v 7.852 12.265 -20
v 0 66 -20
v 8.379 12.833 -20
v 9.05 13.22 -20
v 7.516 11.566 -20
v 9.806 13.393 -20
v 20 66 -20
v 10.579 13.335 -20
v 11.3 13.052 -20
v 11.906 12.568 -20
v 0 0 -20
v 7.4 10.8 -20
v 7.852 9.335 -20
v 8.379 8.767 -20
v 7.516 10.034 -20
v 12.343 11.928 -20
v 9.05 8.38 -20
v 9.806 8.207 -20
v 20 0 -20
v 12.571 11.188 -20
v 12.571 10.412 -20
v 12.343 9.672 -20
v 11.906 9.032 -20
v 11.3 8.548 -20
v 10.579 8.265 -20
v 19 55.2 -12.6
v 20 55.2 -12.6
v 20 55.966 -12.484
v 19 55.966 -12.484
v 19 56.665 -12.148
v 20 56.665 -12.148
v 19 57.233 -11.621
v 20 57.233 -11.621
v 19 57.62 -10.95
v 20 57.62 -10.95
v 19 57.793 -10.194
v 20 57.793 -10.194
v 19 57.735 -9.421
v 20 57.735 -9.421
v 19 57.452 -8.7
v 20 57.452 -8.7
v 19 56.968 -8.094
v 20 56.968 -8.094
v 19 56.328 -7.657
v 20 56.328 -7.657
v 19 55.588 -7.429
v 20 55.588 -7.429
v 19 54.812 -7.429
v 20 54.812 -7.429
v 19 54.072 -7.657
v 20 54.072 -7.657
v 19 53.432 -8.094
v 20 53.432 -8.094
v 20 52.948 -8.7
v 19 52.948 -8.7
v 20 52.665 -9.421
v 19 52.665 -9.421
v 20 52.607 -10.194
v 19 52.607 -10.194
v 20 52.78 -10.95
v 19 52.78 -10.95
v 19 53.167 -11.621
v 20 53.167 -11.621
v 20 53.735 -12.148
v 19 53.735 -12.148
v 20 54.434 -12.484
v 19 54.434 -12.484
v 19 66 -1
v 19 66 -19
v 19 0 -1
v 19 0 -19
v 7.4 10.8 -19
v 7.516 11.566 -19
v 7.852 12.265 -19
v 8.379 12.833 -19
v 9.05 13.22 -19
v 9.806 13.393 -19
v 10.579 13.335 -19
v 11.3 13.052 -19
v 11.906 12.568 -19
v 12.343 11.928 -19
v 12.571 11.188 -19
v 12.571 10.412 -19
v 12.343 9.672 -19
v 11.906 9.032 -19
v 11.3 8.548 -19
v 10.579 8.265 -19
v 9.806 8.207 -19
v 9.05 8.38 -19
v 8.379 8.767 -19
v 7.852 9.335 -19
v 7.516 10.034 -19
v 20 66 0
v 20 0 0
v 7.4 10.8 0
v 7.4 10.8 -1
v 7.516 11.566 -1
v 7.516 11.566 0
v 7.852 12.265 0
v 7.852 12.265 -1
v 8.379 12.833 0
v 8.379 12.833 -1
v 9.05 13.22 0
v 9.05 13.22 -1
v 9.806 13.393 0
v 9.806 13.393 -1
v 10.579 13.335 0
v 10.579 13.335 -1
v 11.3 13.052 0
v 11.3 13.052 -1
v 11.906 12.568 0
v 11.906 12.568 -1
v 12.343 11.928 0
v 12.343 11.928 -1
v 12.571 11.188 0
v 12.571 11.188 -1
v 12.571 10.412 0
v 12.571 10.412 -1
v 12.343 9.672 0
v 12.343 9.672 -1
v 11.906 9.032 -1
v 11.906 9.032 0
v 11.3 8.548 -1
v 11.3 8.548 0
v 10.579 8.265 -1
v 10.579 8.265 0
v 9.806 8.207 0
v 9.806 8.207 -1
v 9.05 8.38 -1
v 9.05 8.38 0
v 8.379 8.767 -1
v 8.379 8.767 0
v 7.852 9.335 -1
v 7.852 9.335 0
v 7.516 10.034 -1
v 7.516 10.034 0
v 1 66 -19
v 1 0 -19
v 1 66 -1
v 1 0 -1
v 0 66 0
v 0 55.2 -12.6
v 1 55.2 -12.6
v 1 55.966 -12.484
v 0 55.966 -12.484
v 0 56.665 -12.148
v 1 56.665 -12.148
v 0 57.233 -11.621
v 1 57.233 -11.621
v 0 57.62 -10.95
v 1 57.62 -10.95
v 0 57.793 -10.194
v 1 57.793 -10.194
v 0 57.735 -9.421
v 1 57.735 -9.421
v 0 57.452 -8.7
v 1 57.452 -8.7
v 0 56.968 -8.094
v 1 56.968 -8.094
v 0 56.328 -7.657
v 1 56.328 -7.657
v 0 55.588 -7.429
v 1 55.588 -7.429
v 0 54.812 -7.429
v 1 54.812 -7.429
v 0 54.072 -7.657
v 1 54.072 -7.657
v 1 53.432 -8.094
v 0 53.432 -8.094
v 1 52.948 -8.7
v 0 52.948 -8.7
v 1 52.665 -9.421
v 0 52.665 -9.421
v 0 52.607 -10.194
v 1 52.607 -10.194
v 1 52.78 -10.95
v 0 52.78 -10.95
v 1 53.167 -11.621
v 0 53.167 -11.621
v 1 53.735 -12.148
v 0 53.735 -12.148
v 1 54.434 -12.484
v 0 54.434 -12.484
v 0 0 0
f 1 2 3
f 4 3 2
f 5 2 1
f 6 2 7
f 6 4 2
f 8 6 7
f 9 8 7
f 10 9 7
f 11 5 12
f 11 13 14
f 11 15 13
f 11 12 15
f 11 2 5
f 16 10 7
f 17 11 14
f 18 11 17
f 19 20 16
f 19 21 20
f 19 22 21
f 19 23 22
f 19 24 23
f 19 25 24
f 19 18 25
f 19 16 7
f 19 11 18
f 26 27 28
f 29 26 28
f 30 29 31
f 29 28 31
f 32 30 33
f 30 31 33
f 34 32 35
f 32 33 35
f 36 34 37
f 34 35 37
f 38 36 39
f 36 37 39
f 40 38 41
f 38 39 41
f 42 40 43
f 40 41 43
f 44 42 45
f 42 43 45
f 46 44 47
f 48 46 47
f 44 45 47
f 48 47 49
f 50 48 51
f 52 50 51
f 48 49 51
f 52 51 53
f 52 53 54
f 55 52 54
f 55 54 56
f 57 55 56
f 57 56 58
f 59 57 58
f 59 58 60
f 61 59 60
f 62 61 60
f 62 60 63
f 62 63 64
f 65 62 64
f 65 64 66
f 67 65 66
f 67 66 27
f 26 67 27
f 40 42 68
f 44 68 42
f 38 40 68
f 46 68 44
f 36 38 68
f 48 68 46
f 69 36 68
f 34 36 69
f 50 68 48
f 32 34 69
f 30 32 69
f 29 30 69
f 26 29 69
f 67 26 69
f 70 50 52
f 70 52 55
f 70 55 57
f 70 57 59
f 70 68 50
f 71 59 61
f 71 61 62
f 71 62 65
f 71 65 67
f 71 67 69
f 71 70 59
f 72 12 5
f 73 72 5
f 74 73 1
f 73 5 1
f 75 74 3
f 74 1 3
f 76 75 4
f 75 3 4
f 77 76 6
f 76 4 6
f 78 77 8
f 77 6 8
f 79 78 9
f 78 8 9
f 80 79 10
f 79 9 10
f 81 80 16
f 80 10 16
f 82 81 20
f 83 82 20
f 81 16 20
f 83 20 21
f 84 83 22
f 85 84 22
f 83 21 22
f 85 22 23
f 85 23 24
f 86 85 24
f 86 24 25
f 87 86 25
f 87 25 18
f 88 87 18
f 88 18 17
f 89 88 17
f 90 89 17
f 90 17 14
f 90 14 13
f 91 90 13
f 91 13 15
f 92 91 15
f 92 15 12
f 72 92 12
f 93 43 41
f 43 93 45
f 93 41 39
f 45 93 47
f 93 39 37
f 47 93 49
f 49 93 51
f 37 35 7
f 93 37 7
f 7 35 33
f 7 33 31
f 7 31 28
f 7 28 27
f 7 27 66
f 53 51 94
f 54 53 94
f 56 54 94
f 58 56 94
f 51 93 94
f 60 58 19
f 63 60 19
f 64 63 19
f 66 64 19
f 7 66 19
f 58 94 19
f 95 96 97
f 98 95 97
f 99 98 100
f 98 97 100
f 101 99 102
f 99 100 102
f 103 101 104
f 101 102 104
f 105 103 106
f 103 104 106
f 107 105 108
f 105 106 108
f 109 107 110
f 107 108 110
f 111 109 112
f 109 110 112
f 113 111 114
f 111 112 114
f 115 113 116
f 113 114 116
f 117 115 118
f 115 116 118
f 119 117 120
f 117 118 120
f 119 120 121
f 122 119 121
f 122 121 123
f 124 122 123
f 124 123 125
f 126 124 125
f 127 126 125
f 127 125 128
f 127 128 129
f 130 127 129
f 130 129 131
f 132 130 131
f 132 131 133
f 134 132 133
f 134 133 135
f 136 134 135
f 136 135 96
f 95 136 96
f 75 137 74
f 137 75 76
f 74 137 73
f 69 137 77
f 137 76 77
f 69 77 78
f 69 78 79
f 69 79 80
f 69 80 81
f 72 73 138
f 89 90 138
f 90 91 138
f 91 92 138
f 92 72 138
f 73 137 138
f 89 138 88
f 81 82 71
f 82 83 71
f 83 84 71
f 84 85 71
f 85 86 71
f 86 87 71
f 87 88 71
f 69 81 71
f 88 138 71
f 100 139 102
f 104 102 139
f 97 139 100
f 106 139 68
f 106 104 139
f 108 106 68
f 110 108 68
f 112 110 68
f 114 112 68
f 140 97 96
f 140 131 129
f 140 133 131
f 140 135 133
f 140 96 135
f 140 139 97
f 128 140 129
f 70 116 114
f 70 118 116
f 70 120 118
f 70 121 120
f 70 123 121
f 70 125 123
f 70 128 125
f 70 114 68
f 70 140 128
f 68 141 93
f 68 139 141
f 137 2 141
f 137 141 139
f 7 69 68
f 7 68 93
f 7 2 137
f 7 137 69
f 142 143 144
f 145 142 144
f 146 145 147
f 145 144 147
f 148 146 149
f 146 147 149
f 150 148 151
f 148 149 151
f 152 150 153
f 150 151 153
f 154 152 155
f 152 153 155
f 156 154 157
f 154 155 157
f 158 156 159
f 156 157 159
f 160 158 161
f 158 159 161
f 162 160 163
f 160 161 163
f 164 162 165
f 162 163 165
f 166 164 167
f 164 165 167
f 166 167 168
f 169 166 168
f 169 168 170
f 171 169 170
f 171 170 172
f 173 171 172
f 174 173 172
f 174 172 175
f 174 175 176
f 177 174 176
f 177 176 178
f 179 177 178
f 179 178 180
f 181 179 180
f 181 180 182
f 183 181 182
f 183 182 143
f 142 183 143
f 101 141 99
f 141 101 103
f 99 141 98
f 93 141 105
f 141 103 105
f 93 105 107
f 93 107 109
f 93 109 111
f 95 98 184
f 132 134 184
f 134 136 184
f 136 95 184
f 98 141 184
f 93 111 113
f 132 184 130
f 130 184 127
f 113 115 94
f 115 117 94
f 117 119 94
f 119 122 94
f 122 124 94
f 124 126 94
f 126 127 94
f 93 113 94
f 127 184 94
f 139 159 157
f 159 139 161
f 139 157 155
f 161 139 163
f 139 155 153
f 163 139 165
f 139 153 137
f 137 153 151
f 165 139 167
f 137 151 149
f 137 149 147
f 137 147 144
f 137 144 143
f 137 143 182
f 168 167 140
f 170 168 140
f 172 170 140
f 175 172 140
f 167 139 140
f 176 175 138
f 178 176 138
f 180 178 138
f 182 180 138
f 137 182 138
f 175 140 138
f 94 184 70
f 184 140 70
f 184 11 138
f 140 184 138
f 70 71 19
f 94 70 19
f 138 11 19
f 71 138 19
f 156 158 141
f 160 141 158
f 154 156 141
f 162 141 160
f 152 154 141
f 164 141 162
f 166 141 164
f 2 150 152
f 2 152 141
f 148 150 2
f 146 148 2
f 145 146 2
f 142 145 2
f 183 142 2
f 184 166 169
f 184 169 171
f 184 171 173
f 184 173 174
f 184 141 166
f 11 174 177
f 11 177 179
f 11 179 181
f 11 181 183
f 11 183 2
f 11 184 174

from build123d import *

# Parameters (mm, degrees)
SKETCH1_W           = 20
SKETCH1_H           = 20
SKETCH1_W_2         = 18
SKETCH1_H_2         = 18
BOSS_EXTRUDE1_DEPTH = 66
SKETCH2_R           = 2.6
CUT_EXTRUDE1_DEPTH  = 66
SKETCH3_R           = 2.6
CUT_EXTRUDE2_DEPTH  = 66


with BuildPart() as part:
    # Sketch1 → Boss-Extrude1 (new body)
    with BuildSketch(Plane(origin=(0, 0, 0), x_dir=(1, 0, 0), z_dir=(0, 1, 0))):
        with Locations((10, 10)):
            Rectangle(SKETCH1_W, SKETCH1_H)
        with Locations((10, 10)):
            Rectangle(SKETCH1_W_2, SKETCH1_H_2, mode=Mode.SUBTRACT)
    extrude(amount=BOSS_EXTRUDE1_DEPTH)

    # Sketch2 → Cut-Extrude1 (cut)
    with BuildSketch(Plane(origin=(20, 0, 0), x_dir=(0, 0, -1), z_dir=(1, 0, 0))):
        with Locations((10, 55.2)):
            Circle(SKETCH2_R)
    extrude(amount=-CUT_EXTRUDE1_DEPTH, mode=Mode.SUBTRACT)

    # Sketch3 → Cut-Extrude2 (cut)
    with BuildSketch(Plane(origin=(0, 0, -20), x_dir=(-1, 0, 0), z_dir=(0, 0, -1))):
        with Locations((-10, 10.8)):
            Circle(SKETCH3_R)
    extrude(amount=-CUT_EXTRUDE2_DEPTH, mode=Mode.SUBTRACT)


solid = part.part
